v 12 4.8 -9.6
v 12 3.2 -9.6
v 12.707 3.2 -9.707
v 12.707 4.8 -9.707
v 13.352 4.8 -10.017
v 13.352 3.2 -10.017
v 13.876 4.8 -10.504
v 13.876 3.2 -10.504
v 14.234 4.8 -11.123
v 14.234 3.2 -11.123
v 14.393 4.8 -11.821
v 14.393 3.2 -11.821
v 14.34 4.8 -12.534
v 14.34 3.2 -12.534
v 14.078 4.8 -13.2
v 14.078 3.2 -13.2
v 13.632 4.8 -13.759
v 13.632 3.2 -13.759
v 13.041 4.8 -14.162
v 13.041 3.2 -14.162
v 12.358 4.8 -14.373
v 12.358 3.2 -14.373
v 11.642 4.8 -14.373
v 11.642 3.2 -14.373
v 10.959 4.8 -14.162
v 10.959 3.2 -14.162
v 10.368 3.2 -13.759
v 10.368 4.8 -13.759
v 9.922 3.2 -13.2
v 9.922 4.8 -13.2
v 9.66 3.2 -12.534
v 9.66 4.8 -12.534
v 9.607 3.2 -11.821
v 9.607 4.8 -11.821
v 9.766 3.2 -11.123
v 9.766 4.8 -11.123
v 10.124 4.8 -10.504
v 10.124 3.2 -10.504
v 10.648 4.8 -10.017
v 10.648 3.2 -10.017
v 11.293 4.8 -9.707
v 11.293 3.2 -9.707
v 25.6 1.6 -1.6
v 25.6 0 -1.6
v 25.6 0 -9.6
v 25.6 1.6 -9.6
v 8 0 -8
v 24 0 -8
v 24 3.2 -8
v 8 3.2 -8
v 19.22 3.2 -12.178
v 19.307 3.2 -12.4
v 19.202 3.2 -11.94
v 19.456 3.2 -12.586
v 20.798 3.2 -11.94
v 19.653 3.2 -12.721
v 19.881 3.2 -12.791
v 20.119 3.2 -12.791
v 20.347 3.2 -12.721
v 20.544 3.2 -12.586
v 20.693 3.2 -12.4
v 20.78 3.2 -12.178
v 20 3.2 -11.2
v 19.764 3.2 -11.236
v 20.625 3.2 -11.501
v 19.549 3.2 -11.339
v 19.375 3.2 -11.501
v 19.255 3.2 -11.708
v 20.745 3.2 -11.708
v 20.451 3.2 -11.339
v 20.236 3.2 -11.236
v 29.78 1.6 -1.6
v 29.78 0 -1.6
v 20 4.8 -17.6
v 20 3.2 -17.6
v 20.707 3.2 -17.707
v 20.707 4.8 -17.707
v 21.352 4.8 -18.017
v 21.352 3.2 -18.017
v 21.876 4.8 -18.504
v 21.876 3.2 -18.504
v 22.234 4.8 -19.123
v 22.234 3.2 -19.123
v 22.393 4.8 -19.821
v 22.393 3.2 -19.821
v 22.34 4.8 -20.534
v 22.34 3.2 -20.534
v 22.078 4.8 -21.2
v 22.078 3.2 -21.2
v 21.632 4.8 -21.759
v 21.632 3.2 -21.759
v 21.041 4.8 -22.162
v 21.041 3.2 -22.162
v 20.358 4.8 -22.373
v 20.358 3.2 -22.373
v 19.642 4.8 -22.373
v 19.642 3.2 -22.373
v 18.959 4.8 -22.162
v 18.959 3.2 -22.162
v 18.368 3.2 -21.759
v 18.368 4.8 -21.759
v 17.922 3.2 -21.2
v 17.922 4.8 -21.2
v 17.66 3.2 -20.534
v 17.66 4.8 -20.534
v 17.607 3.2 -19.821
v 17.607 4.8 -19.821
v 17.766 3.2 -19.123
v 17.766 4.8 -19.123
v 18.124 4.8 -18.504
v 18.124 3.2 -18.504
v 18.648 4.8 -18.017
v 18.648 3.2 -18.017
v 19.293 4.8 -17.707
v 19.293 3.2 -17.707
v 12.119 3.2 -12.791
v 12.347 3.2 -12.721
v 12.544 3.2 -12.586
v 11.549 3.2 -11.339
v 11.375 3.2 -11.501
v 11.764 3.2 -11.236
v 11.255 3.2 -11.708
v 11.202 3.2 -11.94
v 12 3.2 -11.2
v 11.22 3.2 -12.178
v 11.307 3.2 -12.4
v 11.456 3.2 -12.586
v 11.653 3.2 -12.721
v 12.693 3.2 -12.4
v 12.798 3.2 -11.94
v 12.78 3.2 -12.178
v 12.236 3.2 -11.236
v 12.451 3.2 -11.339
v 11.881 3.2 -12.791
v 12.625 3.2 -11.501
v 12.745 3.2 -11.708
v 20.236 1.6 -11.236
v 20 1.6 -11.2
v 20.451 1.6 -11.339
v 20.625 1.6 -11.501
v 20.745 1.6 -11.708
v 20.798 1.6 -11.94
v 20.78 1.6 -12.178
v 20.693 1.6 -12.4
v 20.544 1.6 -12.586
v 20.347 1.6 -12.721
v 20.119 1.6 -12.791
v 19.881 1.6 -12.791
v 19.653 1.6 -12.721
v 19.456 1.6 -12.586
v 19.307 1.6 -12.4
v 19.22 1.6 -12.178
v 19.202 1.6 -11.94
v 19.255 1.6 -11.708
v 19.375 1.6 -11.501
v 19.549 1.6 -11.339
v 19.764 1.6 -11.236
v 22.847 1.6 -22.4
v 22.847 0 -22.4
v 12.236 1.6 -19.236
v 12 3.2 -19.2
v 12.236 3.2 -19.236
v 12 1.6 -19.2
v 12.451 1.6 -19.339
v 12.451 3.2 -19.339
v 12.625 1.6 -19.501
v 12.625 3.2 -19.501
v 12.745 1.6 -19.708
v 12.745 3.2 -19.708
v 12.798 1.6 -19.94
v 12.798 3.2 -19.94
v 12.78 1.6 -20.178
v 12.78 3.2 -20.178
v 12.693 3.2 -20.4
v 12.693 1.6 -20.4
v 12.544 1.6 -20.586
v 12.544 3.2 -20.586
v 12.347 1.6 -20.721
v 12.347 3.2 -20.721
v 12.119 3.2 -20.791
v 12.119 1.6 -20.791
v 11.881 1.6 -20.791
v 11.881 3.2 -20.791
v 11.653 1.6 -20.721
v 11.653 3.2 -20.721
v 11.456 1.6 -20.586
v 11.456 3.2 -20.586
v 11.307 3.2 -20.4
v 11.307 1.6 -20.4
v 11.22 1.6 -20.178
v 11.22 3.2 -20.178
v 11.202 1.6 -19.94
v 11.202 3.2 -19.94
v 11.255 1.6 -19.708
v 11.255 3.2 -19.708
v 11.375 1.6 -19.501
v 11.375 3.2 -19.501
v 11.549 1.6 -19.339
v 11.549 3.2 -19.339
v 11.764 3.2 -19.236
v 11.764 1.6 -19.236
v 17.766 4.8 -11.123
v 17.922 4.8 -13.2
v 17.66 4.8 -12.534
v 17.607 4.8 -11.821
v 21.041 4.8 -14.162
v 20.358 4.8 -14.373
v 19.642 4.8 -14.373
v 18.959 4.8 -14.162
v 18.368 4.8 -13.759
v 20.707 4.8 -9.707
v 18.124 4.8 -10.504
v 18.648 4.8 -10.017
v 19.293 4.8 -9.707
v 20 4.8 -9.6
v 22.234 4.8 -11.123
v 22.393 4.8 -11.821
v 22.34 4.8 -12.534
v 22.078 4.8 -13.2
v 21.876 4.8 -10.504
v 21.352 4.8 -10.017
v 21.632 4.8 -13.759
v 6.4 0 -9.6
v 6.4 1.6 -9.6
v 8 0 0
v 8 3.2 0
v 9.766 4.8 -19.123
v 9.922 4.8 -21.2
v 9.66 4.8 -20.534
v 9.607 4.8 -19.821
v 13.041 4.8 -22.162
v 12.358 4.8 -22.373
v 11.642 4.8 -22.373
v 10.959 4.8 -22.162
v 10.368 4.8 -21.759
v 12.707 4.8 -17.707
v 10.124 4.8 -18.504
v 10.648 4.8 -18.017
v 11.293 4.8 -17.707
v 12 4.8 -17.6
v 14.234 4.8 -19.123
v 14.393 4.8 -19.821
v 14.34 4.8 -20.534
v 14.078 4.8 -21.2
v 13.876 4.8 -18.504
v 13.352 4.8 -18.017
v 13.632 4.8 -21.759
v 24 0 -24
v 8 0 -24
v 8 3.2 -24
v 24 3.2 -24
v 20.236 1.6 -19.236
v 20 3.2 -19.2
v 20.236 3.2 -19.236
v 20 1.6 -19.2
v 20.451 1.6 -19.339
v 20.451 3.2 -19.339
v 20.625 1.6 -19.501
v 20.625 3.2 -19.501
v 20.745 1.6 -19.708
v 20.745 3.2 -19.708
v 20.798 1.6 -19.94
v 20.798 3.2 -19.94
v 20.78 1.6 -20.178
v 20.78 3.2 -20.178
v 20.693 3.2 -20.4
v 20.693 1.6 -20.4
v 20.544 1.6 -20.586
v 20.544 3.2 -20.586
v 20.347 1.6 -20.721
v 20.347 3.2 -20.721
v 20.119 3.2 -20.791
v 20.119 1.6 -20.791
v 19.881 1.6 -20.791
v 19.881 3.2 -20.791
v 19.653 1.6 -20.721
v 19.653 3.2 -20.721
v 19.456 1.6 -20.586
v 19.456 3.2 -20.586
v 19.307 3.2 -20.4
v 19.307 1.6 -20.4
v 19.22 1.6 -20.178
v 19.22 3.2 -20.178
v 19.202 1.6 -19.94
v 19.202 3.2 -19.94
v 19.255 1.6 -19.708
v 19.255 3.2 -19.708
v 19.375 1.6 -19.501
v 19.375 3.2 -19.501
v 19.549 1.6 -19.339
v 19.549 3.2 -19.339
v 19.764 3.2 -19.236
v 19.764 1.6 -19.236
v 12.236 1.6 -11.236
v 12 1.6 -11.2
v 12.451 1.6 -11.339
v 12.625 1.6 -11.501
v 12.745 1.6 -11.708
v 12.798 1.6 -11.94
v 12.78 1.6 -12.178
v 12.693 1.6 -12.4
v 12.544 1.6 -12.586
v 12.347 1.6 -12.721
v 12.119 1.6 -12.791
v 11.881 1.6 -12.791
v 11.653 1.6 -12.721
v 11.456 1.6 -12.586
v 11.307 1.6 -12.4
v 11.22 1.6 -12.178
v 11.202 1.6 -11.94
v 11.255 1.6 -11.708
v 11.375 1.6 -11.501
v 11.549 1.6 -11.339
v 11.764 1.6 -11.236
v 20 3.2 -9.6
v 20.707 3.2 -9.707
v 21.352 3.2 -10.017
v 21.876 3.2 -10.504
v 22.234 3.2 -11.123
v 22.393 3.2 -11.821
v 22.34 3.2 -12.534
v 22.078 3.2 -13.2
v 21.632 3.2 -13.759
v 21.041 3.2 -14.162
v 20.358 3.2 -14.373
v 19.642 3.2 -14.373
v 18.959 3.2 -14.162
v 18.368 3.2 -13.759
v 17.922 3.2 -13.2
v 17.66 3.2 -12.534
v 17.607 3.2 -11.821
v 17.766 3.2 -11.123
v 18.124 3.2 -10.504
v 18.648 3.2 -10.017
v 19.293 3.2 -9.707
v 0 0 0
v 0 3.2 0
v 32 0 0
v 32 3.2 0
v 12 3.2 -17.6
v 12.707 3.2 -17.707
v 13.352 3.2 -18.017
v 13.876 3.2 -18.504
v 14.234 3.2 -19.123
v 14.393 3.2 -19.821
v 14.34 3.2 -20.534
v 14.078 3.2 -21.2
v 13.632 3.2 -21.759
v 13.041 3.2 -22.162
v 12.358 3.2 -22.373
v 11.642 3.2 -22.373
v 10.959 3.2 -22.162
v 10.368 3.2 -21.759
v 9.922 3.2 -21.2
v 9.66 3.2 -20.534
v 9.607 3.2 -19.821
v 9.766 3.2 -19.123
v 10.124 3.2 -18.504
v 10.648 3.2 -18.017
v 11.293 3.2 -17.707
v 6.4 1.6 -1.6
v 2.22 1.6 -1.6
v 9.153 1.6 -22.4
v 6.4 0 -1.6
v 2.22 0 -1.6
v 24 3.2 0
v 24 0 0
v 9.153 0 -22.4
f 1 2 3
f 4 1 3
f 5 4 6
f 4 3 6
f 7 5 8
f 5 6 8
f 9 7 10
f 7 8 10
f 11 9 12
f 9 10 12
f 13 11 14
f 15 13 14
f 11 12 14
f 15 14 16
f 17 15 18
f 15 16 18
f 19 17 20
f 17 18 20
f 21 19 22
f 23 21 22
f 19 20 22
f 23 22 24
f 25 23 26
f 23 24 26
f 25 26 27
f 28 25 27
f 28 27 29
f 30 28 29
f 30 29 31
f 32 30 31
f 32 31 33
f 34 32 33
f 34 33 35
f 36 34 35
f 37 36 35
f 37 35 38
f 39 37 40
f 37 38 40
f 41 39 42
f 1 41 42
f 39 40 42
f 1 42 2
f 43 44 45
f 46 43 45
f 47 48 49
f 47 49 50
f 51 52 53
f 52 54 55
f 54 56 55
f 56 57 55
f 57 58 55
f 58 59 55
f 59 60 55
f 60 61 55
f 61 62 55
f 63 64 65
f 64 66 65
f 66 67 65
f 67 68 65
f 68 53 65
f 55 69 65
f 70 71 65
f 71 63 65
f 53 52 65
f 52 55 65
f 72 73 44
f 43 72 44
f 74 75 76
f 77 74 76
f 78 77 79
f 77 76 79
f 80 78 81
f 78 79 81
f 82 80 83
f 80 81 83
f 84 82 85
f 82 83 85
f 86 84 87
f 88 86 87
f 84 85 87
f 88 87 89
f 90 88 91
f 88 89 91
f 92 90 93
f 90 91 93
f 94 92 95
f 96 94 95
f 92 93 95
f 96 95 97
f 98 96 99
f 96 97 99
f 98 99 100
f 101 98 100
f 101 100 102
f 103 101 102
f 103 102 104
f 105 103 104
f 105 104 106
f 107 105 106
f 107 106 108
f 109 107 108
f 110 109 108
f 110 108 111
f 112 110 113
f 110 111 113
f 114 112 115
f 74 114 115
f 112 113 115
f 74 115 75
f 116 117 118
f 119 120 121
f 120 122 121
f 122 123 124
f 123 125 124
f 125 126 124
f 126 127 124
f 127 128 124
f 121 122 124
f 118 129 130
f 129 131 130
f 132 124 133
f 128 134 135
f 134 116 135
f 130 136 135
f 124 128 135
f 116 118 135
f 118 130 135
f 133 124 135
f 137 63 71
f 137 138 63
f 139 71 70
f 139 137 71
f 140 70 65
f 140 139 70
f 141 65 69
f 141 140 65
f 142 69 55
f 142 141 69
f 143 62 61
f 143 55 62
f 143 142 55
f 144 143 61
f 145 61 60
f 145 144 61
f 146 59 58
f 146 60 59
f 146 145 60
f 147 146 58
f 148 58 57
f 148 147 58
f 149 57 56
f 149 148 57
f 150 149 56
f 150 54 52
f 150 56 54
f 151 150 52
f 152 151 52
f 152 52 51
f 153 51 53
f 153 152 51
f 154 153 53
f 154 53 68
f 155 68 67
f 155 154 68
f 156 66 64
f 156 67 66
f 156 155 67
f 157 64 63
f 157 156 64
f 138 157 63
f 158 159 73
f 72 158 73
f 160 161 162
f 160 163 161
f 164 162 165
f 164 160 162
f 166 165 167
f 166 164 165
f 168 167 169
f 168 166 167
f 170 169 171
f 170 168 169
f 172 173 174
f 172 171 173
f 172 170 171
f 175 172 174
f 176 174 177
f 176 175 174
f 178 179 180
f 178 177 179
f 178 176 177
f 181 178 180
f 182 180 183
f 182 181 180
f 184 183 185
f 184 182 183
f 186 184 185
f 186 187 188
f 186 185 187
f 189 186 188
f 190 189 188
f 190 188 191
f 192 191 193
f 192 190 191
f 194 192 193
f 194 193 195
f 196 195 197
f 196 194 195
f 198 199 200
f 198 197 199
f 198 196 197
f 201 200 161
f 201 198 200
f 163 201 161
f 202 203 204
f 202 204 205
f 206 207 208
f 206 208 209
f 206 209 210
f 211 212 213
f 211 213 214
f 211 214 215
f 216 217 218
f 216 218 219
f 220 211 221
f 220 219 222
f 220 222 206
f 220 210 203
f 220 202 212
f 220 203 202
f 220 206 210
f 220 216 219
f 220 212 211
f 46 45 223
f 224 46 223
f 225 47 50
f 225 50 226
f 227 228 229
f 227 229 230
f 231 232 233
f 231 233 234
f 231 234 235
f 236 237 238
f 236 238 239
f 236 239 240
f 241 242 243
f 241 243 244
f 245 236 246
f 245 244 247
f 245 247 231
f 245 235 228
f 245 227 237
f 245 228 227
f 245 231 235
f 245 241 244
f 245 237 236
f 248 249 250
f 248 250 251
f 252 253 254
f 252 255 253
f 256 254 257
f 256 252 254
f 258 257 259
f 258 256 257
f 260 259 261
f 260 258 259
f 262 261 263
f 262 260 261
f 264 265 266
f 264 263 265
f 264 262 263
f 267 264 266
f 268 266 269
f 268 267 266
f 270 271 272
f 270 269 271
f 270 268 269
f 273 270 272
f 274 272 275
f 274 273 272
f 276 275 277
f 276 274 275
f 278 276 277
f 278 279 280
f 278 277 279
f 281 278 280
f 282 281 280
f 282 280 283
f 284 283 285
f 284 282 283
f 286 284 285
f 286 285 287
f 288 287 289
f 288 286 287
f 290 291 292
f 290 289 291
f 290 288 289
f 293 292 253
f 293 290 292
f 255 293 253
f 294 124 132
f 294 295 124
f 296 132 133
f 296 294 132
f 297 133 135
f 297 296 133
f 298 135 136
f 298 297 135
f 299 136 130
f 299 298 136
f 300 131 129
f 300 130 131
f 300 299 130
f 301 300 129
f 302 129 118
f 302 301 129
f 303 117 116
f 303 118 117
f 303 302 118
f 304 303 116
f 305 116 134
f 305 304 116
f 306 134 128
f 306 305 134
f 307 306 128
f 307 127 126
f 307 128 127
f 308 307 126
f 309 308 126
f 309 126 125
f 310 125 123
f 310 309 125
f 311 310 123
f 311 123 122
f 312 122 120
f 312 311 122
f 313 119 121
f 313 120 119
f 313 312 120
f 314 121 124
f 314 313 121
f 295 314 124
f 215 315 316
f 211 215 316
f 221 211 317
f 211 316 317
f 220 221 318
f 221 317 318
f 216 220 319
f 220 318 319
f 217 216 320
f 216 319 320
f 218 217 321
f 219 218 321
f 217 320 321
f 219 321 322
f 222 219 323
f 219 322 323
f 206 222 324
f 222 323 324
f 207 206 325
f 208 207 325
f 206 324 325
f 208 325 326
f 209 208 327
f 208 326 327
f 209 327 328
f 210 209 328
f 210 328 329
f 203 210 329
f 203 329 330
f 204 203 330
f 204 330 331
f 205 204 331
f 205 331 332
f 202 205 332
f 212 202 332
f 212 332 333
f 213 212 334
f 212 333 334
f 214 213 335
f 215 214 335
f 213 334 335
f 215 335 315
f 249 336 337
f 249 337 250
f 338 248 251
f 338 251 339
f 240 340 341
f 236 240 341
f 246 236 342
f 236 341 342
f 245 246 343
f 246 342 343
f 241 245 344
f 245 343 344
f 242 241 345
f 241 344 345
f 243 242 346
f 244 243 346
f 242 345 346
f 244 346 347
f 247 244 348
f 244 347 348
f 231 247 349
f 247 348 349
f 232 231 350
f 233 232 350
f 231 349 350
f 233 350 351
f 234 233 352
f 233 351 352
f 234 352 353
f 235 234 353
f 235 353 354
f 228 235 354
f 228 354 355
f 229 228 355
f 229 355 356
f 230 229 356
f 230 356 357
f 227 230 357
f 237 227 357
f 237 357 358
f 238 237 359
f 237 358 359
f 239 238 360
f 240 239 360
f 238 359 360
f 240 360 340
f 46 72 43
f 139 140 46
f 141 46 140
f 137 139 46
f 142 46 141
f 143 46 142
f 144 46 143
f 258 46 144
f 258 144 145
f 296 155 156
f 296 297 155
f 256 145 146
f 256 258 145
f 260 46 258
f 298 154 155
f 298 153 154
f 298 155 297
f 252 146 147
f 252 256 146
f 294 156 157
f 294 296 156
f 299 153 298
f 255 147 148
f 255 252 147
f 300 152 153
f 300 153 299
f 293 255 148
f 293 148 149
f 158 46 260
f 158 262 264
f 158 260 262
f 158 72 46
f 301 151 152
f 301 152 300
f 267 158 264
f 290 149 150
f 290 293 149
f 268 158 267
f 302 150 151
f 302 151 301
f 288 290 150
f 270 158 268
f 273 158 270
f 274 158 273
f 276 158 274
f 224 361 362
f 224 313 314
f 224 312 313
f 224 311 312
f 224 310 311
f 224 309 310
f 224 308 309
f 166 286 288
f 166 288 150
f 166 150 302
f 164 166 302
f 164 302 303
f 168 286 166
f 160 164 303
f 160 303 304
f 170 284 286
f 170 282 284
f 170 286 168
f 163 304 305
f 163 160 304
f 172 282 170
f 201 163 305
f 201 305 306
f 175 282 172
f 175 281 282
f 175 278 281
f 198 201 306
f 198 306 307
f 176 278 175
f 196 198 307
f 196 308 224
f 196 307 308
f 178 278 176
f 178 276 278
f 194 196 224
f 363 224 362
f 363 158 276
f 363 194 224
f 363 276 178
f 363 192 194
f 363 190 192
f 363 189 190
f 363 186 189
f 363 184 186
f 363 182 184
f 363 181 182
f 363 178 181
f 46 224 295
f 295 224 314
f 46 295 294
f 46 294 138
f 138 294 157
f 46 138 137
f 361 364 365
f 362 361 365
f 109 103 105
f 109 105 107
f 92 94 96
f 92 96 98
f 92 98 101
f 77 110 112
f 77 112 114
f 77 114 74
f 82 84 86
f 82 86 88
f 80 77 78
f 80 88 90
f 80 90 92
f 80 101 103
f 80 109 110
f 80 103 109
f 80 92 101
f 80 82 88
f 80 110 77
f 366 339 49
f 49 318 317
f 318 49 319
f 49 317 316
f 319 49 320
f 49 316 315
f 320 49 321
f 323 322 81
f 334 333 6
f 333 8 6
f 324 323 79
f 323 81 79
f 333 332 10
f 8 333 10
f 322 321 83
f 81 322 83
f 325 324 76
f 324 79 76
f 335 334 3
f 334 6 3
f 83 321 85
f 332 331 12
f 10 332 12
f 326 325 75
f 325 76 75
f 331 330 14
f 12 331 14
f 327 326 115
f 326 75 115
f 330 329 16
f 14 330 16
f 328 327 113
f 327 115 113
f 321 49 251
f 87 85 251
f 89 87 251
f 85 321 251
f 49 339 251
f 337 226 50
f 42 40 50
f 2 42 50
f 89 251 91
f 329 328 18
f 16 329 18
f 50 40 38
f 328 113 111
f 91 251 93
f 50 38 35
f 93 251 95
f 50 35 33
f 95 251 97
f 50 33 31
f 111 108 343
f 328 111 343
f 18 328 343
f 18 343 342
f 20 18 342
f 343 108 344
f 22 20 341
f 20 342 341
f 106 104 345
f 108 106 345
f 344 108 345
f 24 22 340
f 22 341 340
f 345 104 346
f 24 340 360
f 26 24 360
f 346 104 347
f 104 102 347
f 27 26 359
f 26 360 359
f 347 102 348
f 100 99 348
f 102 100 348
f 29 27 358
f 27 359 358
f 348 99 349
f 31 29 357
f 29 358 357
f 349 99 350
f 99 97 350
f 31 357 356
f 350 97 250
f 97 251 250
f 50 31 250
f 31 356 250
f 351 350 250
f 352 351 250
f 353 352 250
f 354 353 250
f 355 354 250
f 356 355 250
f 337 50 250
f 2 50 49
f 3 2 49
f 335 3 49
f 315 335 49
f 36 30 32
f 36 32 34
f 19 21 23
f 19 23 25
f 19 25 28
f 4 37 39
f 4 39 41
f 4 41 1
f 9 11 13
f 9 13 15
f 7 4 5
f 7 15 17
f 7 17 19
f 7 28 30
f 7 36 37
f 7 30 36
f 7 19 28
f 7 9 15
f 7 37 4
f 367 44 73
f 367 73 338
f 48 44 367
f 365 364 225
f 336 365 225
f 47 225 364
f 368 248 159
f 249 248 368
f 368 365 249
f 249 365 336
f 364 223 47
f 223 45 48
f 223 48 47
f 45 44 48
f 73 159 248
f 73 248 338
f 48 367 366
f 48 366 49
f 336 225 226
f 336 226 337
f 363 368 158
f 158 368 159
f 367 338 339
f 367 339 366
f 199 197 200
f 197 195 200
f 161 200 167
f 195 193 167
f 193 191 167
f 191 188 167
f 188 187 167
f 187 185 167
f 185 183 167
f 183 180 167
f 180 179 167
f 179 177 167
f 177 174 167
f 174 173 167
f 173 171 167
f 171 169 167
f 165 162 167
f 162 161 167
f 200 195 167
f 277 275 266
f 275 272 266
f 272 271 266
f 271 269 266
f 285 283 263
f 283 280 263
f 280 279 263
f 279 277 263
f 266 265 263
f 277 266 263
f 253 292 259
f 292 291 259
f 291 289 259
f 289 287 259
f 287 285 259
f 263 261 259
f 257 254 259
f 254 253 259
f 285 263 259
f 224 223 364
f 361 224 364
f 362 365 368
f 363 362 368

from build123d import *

# Parameters (mm, degrees)
BOSS_EXTRUDE1_DEPTH  = 3.2
SKETCH2_R            = 2.4
BOSS_EXTRUDE2_DEPTH  = 1.6
LPATTERN1_COUNT      = 2
LPATTERN1_PITCH      = 8
LPATTERN1_COUNT_DIR2 = 2
LPATTERN1_PITCH_DIR2 = 8
SHELL1_T             = -1.6


with BuildPart() as part:
    # Sketch1 → Boss-Extrude1 (new body)
    with BuildSketch(Plane(origin=(0, 0, 0), x_dir=(1, 0, 0), z_dir=(0, 1, 0))):
        Polygon((0, 0), (8, 24), (24, 24), (32, 0), (24, 0), (24, 8), (8, 8), (8, 0), align=None)
    extrude(amount=BOSS_EXTRUDE1_DEPTH)

    # Sketch2 → Boss-Extrude2 (add)
    with BuildSketch(Plane(origin=(0, 3.2, 0), x_dir=(1, 0, 0), z_dir=(0, 1, 0))):
        with Locations(Location((12, 20, 0), (0, 0, 270))):
            Circle(SKETCH2_R)
    boss_extrude2 = extrude(amount=BOSS_EXTRUDE2_DEPTH)

    # LPattern1: Boss-Extrude2 2 × 2
    with Locations(*[(i * LPATTERN1_PITCH, 0, j * LPATTERN1_PITCH_DIR2) for i in range(LPATTERN1_COUNT) for j in range(LPATTERN1_COUNT_DIR2) if (i, j) != (0, 0)]):
        add(boss_extrude2)

    # Shell1
    shell1_openings = [part.faces().sort_by_distance(p)[0] for p in [
        (16, 0, -12.571428571),
    ]]
    offset(amount=SHELL1_T, openings=shell1_openings, kind=Kind.INTERSECTION)


solid = part.part
